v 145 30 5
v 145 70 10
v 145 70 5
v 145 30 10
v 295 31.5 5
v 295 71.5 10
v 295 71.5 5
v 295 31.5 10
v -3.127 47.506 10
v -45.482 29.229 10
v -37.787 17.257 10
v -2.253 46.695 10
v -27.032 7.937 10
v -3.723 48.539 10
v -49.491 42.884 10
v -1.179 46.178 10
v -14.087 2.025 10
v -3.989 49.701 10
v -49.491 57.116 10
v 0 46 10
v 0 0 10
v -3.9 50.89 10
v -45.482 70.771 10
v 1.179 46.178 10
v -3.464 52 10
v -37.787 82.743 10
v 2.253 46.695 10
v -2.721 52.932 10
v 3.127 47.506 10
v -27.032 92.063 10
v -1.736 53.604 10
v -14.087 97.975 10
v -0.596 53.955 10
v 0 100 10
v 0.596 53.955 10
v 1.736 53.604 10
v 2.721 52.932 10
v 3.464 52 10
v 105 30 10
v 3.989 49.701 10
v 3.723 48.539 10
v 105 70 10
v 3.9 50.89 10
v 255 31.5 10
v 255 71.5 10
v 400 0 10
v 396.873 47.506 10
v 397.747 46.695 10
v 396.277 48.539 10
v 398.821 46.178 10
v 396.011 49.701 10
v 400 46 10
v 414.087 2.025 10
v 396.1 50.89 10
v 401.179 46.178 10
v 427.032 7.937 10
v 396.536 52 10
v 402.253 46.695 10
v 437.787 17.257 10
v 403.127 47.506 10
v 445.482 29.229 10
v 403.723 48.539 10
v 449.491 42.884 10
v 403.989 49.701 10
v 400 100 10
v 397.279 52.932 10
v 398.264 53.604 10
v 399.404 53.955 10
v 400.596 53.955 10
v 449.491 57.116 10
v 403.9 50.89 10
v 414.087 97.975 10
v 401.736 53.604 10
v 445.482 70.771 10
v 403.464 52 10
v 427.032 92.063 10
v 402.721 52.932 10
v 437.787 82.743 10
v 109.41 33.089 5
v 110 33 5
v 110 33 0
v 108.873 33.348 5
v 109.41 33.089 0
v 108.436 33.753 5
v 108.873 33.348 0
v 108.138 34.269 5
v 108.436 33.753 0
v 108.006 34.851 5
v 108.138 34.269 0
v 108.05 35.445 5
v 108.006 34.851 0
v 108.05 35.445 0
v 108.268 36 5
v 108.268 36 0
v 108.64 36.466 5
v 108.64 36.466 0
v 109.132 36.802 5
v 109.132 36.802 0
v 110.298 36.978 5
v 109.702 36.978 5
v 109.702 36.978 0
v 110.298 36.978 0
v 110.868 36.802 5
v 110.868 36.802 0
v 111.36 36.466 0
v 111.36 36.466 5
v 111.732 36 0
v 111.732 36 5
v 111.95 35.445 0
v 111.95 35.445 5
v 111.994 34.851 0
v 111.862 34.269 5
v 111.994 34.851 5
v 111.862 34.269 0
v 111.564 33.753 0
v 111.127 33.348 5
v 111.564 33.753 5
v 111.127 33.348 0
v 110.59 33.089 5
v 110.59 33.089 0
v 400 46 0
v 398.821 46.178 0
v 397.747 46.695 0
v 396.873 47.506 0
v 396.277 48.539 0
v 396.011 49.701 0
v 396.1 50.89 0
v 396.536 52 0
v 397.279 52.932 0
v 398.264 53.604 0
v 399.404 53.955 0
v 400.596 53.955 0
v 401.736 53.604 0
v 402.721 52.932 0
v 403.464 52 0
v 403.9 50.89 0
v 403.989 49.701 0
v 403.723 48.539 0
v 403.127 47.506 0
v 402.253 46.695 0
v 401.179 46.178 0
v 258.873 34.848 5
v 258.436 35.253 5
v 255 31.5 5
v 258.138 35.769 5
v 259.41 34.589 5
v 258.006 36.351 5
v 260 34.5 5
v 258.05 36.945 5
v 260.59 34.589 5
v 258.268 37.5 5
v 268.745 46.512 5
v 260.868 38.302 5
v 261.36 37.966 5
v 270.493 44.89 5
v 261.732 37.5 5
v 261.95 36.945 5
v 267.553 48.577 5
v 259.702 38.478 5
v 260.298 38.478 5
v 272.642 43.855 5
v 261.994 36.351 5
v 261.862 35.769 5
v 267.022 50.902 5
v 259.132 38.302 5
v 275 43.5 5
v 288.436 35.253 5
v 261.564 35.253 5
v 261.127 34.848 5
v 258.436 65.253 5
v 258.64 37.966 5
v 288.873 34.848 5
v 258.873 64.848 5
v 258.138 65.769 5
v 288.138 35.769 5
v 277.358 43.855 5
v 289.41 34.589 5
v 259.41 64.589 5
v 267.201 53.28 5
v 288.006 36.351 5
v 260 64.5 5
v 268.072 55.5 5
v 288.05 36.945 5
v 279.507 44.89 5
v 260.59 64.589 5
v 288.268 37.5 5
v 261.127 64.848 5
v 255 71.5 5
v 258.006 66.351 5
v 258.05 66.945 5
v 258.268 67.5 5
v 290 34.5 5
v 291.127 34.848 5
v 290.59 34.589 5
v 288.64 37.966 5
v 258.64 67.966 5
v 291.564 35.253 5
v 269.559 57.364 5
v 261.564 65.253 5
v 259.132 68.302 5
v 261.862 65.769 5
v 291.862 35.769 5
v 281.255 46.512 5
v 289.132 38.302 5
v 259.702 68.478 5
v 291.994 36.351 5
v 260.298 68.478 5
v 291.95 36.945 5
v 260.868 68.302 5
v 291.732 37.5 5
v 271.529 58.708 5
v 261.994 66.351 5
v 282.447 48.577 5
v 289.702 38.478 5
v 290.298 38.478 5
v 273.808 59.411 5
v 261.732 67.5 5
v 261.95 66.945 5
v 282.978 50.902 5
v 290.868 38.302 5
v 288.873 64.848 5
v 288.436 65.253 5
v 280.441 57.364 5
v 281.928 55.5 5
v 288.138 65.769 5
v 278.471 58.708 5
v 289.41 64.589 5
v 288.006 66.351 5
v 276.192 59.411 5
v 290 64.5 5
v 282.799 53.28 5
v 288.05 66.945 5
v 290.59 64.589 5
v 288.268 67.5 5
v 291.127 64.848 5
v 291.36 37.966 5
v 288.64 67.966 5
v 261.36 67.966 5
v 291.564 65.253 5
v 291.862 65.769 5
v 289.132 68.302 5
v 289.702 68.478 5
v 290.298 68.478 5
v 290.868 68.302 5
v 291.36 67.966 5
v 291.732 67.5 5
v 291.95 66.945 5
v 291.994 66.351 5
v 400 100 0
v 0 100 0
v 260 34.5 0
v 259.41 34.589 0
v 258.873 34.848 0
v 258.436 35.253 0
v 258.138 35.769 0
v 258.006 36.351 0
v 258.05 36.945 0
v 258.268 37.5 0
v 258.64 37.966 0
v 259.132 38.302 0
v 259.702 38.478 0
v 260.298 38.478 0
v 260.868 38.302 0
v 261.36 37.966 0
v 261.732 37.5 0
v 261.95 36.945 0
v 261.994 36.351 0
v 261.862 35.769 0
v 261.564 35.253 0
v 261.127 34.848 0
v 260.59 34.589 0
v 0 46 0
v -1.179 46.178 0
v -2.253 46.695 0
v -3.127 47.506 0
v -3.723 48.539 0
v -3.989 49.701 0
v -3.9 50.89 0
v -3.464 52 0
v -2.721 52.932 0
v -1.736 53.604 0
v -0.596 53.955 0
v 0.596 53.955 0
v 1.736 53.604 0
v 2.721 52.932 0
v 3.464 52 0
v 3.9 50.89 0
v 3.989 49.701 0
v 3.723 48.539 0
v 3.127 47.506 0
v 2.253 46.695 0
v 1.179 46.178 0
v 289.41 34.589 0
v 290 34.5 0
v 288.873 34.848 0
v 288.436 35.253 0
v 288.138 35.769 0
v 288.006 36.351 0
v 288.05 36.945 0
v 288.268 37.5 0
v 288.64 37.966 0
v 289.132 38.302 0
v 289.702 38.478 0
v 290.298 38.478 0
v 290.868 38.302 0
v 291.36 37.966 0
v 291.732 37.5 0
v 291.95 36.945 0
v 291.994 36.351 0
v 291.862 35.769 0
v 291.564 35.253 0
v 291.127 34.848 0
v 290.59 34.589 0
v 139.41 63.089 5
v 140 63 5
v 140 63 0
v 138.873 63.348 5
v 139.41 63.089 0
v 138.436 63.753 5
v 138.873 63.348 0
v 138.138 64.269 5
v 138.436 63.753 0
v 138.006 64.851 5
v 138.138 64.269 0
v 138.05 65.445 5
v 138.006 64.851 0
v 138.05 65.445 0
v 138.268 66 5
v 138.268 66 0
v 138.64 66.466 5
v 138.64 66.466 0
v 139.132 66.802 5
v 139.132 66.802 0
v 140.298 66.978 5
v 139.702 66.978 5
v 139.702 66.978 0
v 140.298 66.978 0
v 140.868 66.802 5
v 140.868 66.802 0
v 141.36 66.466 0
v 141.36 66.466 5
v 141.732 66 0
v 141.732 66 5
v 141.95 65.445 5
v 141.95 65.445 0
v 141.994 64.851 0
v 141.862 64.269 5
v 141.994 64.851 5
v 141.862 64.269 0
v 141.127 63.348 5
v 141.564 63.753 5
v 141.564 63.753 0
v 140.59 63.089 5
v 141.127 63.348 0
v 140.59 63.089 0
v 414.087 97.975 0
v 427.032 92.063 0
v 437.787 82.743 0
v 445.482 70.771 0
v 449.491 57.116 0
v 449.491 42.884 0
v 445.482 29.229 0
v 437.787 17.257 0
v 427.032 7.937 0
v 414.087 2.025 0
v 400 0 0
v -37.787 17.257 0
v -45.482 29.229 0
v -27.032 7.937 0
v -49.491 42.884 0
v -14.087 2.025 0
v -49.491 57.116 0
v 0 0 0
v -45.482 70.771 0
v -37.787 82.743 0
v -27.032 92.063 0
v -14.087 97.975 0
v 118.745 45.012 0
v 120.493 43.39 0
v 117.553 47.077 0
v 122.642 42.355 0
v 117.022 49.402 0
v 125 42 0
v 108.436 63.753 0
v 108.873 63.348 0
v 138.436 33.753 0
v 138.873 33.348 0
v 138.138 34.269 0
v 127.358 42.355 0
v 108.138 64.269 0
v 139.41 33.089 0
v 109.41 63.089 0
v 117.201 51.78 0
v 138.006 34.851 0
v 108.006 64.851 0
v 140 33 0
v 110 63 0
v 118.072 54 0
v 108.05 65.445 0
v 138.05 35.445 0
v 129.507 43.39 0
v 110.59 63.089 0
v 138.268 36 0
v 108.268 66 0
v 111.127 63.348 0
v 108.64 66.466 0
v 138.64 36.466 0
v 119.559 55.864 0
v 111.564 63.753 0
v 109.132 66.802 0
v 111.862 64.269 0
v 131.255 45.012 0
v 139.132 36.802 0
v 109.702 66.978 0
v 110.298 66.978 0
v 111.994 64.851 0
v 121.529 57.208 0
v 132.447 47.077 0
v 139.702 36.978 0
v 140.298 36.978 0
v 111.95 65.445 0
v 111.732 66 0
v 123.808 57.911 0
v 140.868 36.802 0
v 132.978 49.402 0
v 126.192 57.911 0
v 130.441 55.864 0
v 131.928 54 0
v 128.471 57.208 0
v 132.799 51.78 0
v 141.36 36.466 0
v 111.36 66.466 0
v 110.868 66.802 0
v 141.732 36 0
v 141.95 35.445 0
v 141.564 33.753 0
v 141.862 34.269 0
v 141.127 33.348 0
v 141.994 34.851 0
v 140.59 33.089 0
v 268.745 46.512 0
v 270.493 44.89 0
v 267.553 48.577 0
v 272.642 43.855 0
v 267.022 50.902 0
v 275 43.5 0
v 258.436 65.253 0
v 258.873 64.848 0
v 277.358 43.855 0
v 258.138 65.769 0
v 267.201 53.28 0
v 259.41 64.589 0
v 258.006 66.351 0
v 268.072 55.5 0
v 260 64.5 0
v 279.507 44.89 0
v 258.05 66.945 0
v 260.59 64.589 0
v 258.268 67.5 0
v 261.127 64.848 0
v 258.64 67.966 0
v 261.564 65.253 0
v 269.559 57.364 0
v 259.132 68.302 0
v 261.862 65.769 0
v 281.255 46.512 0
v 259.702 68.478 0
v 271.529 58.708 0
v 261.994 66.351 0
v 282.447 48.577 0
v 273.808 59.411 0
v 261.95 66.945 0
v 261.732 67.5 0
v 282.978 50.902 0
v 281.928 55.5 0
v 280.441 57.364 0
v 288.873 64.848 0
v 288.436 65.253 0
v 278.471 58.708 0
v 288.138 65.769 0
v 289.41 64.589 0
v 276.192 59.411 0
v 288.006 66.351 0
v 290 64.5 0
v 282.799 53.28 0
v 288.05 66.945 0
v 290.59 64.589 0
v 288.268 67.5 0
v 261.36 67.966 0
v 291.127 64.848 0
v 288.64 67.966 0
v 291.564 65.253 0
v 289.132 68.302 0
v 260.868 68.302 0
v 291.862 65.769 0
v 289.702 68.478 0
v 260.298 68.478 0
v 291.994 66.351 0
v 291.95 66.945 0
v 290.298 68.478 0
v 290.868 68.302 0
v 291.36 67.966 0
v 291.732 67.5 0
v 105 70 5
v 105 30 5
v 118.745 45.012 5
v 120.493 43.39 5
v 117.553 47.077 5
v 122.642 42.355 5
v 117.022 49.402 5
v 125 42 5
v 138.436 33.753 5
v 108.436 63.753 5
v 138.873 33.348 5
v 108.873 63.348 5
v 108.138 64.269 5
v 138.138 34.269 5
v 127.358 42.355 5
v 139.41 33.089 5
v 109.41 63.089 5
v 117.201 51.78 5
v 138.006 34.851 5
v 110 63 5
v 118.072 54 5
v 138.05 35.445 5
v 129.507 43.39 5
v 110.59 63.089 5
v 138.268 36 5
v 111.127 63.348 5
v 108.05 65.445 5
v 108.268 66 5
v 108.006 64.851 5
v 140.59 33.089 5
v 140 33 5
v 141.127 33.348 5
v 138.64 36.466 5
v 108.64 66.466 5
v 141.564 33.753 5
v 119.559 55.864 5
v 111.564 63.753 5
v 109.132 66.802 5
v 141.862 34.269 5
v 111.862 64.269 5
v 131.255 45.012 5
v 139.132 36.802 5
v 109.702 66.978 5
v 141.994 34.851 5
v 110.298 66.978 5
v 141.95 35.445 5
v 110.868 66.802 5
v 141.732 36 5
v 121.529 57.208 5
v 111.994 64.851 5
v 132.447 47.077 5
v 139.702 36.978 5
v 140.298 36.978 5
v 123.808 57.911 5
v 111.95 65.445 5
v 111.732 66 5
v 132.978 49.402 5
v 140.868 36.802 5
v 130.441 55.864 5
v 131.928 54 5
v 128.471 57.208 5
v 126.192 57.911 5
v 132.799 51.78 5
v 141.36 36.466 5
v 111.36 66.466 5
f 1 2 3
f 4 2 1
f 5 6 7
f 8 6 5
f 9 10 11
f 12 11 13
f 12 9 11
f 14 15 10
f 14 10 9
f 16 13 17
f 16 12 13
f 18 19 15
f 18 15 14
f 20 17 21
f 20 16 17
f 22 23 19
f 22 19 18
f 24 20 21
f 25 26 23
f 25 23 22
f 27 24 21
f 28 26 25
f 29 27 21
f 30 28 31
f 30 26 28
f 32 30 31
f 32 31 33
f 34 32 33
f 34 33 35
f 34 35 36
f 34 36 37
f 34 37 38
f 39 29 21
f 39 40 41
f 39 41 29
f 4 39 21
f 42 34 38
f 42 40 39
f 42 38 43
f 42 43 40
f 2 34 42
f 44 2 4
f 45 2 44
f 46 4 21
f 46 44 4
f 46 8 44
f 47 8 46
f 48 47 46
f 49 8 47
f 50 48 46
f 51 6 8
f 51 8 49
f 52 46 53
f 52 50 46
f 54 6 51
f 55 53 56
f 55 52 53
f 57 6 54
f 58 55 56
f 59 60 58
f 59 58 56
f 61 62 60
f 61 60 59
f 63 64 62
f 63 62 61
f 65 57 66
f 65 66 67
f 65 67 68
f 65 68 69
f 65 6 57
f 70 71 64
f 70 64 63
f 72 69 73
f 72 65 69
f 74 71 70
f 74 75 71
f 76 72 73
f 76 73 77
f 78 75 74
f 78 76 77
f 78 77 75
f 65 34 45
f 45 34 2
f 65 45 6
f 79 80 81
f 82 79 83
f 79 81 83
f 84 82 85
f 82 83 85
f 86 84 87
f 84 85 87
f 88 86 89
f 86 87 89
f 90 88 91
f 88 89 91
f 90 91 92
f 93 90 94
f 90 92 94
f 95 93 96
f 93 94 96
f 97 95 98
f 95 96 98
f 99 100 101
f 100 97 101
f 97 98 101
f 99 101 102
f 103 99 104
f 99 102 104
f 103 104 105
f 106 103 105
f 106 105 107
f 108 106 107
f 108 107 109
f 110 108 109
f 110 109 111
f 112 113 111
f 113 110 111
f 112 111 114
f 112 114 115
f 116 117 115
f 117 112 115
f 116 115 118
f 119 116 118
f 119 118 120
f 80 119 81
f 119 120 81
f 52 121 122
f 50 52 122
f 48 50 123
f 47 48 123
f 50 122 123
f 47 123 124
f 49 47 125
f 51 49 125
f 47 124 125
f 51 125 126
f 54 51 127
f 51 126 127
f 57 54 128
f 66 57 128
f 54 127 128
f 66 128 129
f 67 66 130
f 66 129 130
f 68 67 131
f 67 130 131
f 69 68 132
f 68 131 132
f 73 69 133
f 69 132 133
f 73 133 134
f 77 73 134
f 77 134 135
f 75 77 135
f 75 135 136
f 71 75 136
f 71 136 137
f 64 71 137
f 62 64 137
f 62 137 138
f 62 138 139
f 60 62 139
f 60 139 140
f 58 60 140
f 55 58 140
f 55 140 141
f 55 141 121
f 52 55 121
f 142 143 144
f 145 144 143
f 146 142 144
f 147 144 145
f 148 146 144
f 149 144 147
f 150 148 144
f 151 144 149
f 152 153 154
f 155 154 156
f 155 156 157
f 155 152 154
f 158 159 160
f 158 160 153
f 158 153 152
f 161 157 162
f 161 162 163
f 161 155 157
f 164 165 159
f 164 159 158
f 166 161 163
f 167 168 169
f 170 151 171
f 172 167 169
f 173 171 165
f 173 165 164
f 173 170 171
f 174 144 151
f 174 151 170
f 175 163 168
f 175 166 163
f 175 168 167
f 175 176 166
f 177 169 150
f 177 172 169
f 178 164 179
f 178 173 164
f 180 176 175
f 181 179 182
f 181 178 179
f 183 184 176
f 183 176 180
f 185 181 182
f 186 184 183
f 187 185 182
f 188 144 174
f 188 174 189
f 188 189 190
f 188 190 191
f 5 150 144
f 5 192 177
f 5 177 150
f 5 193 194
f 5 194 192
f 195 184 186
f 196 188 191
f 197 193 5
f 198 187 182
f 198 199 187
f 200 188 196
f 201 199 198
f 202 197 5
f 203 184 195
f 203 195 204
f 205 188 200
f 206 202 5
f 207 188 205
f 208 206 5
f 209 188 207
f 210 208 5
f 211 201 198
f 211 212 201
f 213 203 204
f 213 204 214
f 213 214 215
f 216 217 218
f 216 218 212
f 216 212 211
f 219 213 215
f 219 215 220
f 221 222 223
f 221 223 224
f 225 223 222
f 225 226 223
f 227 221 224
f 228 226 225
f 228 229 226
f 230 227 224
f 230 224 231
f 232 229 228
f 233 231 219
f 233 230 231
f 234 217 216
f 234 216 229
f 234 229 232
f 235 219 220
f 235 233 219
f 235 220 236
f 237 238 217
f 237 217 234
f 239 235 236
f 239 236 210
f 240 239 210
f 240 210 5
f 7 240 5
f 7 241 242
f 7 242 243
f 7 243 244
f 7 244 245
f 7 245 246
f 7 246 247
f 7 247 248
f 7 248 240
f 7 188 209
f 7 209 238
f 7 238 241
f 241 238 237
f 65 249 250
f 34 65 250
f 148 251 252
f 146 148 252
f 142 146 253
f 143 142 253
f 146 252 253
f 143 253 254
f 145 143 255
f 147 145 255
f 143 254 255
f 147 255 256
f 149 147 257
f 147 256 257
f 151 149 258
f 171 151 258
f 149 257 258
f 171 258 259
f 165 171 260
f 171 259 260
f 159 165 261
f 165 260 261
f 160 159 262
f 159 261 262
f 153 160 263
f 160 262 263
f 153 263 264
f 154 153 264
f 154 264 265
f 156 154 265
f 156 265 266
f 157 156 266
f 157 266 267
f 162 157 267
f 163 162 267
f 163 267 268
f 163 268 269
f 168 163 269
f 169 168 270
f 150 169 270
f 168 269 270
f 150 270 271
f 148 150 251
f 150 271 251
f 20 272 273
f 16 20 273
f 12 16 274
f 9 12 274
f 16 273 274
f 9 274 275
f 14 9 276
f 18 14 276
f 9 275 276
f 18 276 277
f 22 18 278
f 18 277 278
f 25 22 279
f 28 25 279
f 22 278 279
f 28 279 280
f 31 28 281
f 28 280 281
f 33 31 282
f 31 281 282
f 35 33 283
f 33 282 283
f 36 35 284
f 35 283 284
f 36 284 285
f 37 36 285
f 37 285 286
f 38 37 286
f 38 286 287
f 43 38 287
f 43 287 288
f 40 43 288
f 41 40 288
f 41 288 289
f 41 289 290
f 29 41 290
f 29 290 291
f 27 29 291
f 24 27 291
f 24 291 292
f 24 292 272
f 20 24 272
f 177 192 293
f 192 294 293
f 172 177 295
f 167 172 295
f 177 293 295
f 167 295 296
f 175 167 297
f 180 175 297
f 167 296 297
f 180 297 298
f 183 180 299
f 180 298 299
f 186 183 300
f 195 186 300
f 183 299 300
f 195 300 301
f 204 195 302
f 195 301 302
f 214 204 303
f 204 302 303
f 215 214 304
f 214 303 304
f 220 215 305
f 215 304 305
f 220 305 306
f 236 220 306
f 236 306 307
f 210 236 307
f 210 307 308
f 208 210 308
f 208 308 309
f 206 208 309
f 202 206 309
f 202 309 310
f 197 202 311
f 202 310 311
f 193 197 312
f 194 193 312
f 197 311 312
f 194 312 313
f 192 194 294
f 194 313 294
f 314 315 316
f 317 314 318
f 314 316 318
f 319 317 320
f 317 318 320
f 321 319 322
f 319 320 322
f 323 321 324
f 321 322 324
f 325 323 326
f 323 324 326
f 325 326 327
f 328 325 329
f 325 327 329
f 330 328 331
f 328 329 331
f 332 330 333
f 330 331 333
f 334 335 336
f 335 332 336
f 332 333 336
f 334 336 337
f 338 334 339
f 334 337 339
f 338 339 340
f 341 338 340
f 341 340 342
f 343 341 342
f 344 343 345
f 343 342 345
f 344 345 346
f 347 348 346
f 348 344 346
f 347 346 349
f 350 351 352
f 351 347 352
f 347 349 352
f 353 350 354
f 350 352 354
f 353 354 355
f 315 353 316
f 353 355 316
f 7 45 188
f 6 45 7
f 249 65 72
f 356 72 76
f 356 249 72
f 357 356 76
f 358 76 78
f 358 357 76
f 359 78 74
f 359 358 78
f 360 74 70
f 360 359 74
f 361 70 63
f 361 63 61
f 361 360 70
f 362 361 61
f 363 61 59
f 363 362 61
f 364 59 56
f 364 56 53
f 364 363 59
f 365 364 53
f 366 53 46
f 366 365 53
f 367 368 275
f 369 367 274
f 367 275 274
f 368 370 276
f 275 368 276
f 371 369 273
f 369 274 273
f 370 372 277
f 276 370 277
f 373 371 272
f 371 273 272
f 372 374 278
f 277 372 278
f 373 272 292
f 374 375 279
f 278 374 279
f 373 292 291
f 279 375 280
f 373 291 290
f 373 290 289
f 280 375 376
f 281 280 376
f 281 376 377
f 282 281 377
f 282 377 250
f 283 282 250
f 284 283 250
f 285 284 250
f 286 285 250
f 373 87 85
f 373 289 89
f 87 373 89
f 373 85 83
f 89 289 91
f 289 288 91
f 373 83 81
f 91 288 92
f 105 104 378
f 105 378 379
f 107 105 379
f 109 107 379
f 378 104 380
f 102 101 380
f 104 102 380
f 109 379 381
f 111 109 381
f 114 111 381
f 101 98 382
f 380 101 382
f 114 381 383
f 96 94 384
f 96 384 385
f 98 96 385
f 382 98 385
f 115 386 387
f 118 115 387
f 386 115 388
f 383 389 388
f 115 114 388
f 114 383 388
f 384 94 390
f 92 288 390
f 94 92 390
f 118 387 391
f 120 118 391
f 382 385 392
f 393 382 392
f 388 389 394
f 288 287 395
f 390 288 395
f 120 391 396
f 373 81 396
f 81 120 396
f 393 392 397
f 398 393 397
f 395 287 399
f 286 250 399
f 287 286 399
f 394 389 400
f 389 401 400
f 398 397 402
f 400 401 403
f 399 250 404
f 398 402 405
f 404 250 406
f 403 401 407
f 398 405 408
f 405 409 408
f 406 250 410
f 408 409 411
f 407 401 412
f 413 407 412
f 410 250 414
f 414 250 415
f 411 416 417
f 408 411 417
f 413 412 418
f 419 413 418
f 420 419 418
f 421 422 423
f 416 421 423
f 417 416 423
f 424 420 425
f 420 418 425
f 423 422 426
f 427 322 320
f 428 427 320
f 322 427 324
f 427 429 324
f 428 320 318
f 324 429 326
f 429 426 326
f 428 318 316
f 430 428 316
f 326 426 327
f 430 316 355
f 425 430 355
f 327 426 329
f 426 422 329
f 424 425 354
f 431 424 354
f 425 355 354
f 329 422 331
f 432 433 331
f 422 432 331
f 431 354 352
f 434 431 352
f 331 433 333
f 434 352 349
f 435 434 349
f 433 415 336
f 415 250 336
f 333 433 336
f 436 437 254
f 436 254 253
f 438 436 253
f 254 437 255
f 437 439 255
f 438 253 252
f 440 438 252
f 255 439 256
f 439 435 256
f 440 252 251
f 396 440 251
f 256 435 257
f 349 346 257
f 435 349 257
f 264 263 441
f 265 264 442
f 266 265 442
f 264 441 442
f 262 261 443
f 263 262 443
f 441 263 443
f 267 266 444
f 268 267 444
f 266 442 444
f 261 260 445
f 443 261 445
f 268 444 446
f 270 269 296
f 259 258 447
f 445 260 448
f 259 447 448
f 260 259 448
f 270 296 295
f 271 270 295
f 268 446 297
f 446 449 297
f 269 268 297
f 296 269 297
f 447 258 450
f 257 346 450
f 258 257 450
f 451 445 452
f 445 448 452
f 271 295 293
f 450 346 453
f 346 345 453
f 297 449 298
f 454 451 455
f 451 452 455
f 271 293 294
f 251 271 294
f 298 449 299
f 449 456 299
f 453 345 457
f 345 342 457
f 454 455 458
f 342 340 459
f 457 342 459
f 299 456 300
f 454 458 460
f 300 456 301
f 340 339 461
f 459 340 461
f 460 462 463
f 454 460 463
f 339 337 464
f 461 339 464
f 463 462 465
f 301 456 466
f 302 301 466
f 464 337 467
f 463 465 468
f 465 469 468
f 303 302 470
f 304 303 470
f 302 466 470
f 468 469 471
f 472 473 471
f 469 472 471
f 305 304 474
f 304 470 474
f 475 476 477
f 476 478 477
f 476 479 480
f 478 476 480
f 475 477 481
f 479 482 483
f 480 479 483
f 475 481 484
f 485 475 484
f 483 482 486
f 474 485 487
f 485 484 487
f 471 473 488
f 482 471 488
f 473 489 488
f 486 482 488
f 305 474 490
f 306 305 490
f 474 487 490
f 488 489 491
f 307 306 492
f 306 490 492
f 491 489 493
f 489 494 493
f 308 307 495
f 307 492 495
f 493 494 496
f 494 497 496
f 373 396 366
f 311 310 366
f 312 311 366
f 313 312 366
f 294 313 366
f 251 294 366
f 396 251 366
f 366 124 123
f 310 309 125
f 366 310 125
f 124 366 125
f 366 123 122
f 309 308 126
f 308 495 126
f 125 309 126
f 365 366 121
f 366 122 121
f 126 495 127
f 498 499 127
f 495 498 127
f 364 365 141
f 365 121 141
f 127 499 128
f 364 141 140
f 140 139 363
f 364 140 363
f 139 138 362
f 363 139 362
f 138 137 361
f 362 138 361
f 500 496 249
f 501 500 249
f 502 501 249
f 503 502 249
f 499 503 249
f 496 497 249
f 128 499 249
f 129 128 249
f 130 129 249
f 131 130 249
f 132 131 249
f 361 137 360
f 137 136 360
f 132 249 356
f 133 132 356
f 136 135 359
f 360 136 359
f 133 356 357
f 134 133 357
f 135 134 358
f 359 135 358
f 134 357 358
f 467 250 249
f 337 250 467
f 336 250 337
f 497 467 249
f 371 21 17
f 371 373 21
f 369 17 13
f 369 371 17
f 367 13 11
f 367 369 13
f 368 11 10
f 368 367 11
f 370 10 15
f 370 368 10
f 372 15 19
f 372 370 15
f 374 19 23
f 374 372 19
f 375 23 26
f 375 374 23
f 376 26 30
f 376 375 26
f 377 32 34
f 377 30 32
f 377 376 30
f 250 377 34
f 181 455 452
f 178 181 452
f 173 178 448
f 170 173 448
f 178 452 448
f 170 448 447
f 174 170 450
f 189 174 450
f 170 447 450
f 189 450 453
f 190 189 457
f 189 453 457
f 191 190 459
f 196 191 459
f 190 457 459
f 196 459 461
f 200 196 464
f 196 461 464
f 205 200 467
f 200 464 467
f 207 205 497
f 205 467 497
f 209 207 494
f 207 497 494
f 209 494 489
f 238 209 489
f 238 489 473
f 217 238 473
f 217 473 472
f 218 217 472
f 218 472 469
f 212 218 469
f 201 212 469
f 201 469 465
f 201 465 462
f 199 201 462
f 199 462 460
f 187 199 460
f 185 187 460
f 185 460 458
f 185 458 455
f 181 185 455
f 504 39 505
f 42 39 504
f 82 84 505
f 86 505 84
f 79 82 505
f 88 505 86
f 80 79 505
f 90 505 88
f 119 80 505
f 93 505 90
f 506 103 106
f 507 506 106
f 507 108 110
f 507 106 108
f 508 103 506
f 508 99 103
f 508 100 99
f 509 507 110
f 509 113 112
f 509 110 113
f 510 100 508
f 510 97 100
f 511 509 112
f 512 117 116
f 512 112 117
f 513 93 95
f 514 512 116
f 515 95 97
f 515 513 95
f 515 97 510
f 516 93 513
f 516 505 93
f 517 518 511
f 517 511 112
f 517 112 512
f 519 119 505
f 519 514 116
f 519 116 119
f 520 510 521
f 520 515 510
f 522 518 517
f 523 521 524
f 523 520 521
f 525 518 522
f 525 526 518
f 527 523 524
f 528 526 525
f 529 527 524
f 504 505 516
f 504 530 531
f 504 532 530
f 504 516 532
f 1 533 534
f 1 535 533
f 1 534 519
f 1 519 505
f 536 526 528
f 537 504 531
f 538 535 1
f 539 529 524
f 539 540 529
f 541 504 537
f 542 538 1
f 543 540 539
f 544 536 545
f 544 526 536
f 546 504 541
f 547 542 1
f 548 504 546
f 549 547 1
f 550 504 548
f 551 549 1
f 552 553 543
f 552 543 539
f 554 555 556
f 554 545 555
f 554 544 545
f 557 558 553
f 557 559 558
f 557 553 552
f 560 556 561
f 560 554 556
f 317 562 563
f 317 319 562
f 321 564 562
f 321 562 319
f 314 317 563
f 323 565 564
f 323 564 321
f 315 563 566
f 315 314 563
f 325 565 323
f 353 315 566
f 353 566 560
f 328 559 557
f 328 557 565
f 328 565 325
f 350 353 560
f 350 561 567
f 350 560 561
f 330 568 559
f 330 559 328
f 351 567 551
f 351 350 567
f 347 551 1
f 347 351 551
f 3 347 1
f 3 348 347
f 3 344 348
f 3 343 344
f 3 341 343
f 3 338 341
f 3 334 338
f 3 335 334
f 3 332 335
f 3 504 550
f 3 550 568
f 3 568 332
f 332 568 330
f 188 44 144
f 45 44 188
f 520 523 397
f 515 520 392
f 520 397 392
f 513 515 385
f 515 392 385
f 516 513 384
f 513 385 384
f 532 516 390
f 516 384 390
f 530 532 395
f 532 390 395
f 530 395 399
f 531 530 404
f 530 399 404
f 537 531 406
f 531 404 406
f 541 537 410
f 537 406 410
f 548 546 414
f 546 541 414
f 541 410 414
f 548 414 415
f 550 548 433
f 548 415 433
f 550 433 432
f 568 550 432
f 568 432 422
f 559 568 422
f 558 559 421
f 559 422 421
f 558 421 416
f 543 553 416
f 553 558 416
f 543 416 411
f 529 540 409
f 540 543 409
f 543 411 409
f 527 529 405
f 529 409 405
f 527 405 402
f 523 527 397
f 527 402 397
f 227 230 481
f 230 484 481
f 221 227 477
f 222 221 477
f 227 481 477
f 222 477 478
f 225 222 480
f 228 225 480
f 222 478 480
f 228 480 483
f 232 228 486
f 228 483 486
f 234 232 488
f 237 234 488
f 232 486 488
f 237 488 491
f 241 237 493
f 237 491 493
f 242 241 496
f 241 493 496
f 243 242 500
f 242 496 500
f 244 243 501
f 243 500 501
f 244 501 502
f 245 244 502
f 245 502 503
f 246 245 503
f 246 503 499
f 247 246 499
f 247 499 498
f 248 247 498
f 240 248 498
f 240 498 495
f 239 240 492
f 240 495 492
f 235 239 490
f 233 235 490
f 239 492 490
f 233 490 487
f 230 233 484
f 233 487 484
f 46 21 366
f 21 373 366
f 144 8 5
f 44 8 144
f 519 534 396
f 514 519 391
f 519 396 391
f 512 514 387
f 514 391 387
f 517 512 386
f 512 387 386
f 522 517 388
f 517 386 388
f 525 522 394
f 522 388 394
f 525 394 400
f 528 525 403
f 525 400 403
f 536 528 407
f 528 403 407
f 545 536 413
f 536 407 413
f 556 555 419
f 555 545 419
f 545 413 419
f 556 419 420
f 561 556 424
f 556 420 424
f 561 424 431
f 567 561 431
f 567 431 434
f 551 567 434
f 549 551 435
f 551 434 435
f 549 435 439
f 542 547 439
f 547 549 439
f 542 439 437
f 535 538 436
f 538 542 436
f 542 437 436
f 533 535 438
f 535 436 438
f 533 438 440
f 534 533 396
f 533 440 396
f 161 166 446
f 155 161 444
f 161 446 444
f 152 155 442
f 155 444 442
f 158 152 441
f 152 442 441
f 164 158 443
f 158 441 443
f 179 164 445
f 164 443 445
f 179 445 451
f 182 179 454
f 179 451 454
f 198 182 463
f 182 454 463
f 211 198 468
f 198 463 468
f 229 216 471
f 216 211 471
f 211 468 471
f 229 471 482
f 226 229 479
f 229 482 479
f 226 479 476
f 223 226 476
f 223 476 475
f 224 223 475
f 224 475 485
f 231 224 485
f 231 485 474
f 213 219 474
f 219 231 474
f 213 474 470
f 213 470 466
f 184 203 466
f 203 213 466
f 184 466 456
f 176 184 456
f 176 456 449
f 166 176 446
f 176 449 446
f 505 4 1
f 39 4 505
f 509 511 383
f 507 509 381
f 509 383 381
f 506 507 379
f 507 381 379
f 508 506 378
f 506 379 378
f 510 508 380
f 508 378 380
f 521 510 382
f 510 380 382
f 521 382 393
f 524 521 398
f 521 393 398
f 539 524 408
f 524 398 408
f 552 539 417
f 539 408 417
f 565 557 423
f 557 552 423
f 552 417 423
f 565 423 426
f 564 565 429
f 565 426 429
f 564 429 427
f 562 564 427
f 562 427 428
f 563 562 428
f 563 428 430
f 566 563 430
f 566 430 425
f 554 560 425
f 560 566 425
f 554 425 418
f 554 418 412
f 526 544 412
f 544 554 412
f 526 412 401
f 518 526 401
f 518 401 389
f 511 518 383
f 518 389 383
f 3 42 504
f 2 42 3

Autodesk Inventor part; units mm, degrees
ref_plane "YZ Plane" through (0, 0, 0) normal (1, 0, 0) x (0, 1, 0)
ref_plane "XZ Plane" through (0, 0, 0) normal (0, 1, 0) x (-1, 0, 0)
ref_plane "XY Plane" through (0, 0, 0) normal (0, 0, 1) x (1, 0, 0)
sketch "Sketch1" plane through (0, 0, 0) normal (0, 0, 1) x (1, 0, 0)
  line L0 (0, 0) -> (400, 0)
  line L1 (400, 0) -> (400, 100)
  line L2 (400, 100) -> (0, 100)
  line L3 (0, 100) -> (0, 0)
  circle A0 centre (0, 50) radius 50
  circle A1 centre (400, 50) radius 50
  dimension "d0" = 400
  dimension "d1" = 100
extrude "Extrusion1" add sketch "Sketch1" along normal blind 10
sketch "Sketch2" plane through (0, 0, 10) normal (0, 0, 1) x (1, 0, 0)
  arc A0 (0, 100) -> (0, 0) centre (0, 50) ccw projected
  arc A1 (400, 0) -> (400, 100) centre (400, 50) ccw projected
hole "Hole1" at (0, 50, 10) at (400, 50, 10) direction (0, 0, -1) diameter 8 end through all
sketch "Sketch3" plane through (0, 0, 10) normal (0, 0, 1) x (1, 0, 0)
  circle A0 centre (0, 50) radius 4 projected
  circle A1 centre (400, 50) radius 4 projected
  point P0 (125, 50)
  point P1 (275, 51.5)
  dimension "d11" = 125
  dimension "d55" = 125
hole "Hole2" at (125, 50, 10) at (275, 51.5, 10) direction (0, 0, -1) diameter 16 end through all
sketch "Sketch4" plane through (0, 0, 10) normal (0, 0, 1) x (1, 0, 0)
  circle A0 centre (275, 51.5) radius 8 projected
  circle A1 centre (125, 50) radius 8 projected
  line L0 (110, 65) -> (140, 65)
  line L1 (140, 65) -> (140, 35)
  line L2 (140, 35) -> (110, 35)
  line L3 (110, 35) -> (110, 65)
  line L4 (260, 66.5) -> (290, 66.5)
  line L5 (290, 66.5) -> (290, 36.5)
  line L6 (290, 36.5) -> (260, 36.5)
  line L7 (260, 36.5) -> (260, 66.5)
  dimension "d22" = 30
  dimension "d23" = 30
  dimension "d26" = 30
  dimension "d27" = 30
  dimension "d30" = 15
  dimension "d32" = 15
  dimension "d34" = 15
  dimension "d36" = 15
hole "Hole3" at (110, 35, 10) at (110, 65, 10) at (140, 65, 10) at (140, 35, 10) at (260, 36.5, 10) at (260, 66.5, 10) at (290, 66.5, 10) at (290, 36.5, 10) direction (0, 0, -1) diameter 4 end through all
sketch "Sketch5" plane through (0, 0, 10) normal (0, 0, 1) x (1, 0, 0)
  circle A0 centre (140, 35) radius 2 projected
  circle A1 centre (140, 65) radius 2 projected
  circle A2 centre (110, 65) radius 2 projected
  circle A3 centre (110, 35) radius 2 projected
  circle A4 centre (125, 50) radius 8 projected
  line L0 (105, 70) -> (145, 70)
  line L1 (145, 70) -> (145, 30)
  line L2 (145, 30) -> (105, 30)
  line L3 (105, 30) -> (105, 70)
  circle A5 centre (275, 51.5) radius 8 projected
  line L4 (255, 71.5) -> (295, 71.5)
  line L5 (295, 71.5) -> (295, 31.5)
  line L6 (295, 31.5) -> (255, 31.5)
  line L7 (255, 31.5) -> (255, 71.5)
  dimension "d45" = 40
  dimension "d46" = 40
  dimension "d47" = 20
  dimension "d48" = 20
  dimension "d51" = 40
  dimension "d52" = 40
  dimension "d53" = 20
  dimension "d54" = 20
extrude "Extrusion2" cut sketch "Sketch5" against normal blind 5
equation "\"d55\" = d11"
equation "\"d32\" = d30"
equation "\"d36\" = d34"
properties part number "base side"
